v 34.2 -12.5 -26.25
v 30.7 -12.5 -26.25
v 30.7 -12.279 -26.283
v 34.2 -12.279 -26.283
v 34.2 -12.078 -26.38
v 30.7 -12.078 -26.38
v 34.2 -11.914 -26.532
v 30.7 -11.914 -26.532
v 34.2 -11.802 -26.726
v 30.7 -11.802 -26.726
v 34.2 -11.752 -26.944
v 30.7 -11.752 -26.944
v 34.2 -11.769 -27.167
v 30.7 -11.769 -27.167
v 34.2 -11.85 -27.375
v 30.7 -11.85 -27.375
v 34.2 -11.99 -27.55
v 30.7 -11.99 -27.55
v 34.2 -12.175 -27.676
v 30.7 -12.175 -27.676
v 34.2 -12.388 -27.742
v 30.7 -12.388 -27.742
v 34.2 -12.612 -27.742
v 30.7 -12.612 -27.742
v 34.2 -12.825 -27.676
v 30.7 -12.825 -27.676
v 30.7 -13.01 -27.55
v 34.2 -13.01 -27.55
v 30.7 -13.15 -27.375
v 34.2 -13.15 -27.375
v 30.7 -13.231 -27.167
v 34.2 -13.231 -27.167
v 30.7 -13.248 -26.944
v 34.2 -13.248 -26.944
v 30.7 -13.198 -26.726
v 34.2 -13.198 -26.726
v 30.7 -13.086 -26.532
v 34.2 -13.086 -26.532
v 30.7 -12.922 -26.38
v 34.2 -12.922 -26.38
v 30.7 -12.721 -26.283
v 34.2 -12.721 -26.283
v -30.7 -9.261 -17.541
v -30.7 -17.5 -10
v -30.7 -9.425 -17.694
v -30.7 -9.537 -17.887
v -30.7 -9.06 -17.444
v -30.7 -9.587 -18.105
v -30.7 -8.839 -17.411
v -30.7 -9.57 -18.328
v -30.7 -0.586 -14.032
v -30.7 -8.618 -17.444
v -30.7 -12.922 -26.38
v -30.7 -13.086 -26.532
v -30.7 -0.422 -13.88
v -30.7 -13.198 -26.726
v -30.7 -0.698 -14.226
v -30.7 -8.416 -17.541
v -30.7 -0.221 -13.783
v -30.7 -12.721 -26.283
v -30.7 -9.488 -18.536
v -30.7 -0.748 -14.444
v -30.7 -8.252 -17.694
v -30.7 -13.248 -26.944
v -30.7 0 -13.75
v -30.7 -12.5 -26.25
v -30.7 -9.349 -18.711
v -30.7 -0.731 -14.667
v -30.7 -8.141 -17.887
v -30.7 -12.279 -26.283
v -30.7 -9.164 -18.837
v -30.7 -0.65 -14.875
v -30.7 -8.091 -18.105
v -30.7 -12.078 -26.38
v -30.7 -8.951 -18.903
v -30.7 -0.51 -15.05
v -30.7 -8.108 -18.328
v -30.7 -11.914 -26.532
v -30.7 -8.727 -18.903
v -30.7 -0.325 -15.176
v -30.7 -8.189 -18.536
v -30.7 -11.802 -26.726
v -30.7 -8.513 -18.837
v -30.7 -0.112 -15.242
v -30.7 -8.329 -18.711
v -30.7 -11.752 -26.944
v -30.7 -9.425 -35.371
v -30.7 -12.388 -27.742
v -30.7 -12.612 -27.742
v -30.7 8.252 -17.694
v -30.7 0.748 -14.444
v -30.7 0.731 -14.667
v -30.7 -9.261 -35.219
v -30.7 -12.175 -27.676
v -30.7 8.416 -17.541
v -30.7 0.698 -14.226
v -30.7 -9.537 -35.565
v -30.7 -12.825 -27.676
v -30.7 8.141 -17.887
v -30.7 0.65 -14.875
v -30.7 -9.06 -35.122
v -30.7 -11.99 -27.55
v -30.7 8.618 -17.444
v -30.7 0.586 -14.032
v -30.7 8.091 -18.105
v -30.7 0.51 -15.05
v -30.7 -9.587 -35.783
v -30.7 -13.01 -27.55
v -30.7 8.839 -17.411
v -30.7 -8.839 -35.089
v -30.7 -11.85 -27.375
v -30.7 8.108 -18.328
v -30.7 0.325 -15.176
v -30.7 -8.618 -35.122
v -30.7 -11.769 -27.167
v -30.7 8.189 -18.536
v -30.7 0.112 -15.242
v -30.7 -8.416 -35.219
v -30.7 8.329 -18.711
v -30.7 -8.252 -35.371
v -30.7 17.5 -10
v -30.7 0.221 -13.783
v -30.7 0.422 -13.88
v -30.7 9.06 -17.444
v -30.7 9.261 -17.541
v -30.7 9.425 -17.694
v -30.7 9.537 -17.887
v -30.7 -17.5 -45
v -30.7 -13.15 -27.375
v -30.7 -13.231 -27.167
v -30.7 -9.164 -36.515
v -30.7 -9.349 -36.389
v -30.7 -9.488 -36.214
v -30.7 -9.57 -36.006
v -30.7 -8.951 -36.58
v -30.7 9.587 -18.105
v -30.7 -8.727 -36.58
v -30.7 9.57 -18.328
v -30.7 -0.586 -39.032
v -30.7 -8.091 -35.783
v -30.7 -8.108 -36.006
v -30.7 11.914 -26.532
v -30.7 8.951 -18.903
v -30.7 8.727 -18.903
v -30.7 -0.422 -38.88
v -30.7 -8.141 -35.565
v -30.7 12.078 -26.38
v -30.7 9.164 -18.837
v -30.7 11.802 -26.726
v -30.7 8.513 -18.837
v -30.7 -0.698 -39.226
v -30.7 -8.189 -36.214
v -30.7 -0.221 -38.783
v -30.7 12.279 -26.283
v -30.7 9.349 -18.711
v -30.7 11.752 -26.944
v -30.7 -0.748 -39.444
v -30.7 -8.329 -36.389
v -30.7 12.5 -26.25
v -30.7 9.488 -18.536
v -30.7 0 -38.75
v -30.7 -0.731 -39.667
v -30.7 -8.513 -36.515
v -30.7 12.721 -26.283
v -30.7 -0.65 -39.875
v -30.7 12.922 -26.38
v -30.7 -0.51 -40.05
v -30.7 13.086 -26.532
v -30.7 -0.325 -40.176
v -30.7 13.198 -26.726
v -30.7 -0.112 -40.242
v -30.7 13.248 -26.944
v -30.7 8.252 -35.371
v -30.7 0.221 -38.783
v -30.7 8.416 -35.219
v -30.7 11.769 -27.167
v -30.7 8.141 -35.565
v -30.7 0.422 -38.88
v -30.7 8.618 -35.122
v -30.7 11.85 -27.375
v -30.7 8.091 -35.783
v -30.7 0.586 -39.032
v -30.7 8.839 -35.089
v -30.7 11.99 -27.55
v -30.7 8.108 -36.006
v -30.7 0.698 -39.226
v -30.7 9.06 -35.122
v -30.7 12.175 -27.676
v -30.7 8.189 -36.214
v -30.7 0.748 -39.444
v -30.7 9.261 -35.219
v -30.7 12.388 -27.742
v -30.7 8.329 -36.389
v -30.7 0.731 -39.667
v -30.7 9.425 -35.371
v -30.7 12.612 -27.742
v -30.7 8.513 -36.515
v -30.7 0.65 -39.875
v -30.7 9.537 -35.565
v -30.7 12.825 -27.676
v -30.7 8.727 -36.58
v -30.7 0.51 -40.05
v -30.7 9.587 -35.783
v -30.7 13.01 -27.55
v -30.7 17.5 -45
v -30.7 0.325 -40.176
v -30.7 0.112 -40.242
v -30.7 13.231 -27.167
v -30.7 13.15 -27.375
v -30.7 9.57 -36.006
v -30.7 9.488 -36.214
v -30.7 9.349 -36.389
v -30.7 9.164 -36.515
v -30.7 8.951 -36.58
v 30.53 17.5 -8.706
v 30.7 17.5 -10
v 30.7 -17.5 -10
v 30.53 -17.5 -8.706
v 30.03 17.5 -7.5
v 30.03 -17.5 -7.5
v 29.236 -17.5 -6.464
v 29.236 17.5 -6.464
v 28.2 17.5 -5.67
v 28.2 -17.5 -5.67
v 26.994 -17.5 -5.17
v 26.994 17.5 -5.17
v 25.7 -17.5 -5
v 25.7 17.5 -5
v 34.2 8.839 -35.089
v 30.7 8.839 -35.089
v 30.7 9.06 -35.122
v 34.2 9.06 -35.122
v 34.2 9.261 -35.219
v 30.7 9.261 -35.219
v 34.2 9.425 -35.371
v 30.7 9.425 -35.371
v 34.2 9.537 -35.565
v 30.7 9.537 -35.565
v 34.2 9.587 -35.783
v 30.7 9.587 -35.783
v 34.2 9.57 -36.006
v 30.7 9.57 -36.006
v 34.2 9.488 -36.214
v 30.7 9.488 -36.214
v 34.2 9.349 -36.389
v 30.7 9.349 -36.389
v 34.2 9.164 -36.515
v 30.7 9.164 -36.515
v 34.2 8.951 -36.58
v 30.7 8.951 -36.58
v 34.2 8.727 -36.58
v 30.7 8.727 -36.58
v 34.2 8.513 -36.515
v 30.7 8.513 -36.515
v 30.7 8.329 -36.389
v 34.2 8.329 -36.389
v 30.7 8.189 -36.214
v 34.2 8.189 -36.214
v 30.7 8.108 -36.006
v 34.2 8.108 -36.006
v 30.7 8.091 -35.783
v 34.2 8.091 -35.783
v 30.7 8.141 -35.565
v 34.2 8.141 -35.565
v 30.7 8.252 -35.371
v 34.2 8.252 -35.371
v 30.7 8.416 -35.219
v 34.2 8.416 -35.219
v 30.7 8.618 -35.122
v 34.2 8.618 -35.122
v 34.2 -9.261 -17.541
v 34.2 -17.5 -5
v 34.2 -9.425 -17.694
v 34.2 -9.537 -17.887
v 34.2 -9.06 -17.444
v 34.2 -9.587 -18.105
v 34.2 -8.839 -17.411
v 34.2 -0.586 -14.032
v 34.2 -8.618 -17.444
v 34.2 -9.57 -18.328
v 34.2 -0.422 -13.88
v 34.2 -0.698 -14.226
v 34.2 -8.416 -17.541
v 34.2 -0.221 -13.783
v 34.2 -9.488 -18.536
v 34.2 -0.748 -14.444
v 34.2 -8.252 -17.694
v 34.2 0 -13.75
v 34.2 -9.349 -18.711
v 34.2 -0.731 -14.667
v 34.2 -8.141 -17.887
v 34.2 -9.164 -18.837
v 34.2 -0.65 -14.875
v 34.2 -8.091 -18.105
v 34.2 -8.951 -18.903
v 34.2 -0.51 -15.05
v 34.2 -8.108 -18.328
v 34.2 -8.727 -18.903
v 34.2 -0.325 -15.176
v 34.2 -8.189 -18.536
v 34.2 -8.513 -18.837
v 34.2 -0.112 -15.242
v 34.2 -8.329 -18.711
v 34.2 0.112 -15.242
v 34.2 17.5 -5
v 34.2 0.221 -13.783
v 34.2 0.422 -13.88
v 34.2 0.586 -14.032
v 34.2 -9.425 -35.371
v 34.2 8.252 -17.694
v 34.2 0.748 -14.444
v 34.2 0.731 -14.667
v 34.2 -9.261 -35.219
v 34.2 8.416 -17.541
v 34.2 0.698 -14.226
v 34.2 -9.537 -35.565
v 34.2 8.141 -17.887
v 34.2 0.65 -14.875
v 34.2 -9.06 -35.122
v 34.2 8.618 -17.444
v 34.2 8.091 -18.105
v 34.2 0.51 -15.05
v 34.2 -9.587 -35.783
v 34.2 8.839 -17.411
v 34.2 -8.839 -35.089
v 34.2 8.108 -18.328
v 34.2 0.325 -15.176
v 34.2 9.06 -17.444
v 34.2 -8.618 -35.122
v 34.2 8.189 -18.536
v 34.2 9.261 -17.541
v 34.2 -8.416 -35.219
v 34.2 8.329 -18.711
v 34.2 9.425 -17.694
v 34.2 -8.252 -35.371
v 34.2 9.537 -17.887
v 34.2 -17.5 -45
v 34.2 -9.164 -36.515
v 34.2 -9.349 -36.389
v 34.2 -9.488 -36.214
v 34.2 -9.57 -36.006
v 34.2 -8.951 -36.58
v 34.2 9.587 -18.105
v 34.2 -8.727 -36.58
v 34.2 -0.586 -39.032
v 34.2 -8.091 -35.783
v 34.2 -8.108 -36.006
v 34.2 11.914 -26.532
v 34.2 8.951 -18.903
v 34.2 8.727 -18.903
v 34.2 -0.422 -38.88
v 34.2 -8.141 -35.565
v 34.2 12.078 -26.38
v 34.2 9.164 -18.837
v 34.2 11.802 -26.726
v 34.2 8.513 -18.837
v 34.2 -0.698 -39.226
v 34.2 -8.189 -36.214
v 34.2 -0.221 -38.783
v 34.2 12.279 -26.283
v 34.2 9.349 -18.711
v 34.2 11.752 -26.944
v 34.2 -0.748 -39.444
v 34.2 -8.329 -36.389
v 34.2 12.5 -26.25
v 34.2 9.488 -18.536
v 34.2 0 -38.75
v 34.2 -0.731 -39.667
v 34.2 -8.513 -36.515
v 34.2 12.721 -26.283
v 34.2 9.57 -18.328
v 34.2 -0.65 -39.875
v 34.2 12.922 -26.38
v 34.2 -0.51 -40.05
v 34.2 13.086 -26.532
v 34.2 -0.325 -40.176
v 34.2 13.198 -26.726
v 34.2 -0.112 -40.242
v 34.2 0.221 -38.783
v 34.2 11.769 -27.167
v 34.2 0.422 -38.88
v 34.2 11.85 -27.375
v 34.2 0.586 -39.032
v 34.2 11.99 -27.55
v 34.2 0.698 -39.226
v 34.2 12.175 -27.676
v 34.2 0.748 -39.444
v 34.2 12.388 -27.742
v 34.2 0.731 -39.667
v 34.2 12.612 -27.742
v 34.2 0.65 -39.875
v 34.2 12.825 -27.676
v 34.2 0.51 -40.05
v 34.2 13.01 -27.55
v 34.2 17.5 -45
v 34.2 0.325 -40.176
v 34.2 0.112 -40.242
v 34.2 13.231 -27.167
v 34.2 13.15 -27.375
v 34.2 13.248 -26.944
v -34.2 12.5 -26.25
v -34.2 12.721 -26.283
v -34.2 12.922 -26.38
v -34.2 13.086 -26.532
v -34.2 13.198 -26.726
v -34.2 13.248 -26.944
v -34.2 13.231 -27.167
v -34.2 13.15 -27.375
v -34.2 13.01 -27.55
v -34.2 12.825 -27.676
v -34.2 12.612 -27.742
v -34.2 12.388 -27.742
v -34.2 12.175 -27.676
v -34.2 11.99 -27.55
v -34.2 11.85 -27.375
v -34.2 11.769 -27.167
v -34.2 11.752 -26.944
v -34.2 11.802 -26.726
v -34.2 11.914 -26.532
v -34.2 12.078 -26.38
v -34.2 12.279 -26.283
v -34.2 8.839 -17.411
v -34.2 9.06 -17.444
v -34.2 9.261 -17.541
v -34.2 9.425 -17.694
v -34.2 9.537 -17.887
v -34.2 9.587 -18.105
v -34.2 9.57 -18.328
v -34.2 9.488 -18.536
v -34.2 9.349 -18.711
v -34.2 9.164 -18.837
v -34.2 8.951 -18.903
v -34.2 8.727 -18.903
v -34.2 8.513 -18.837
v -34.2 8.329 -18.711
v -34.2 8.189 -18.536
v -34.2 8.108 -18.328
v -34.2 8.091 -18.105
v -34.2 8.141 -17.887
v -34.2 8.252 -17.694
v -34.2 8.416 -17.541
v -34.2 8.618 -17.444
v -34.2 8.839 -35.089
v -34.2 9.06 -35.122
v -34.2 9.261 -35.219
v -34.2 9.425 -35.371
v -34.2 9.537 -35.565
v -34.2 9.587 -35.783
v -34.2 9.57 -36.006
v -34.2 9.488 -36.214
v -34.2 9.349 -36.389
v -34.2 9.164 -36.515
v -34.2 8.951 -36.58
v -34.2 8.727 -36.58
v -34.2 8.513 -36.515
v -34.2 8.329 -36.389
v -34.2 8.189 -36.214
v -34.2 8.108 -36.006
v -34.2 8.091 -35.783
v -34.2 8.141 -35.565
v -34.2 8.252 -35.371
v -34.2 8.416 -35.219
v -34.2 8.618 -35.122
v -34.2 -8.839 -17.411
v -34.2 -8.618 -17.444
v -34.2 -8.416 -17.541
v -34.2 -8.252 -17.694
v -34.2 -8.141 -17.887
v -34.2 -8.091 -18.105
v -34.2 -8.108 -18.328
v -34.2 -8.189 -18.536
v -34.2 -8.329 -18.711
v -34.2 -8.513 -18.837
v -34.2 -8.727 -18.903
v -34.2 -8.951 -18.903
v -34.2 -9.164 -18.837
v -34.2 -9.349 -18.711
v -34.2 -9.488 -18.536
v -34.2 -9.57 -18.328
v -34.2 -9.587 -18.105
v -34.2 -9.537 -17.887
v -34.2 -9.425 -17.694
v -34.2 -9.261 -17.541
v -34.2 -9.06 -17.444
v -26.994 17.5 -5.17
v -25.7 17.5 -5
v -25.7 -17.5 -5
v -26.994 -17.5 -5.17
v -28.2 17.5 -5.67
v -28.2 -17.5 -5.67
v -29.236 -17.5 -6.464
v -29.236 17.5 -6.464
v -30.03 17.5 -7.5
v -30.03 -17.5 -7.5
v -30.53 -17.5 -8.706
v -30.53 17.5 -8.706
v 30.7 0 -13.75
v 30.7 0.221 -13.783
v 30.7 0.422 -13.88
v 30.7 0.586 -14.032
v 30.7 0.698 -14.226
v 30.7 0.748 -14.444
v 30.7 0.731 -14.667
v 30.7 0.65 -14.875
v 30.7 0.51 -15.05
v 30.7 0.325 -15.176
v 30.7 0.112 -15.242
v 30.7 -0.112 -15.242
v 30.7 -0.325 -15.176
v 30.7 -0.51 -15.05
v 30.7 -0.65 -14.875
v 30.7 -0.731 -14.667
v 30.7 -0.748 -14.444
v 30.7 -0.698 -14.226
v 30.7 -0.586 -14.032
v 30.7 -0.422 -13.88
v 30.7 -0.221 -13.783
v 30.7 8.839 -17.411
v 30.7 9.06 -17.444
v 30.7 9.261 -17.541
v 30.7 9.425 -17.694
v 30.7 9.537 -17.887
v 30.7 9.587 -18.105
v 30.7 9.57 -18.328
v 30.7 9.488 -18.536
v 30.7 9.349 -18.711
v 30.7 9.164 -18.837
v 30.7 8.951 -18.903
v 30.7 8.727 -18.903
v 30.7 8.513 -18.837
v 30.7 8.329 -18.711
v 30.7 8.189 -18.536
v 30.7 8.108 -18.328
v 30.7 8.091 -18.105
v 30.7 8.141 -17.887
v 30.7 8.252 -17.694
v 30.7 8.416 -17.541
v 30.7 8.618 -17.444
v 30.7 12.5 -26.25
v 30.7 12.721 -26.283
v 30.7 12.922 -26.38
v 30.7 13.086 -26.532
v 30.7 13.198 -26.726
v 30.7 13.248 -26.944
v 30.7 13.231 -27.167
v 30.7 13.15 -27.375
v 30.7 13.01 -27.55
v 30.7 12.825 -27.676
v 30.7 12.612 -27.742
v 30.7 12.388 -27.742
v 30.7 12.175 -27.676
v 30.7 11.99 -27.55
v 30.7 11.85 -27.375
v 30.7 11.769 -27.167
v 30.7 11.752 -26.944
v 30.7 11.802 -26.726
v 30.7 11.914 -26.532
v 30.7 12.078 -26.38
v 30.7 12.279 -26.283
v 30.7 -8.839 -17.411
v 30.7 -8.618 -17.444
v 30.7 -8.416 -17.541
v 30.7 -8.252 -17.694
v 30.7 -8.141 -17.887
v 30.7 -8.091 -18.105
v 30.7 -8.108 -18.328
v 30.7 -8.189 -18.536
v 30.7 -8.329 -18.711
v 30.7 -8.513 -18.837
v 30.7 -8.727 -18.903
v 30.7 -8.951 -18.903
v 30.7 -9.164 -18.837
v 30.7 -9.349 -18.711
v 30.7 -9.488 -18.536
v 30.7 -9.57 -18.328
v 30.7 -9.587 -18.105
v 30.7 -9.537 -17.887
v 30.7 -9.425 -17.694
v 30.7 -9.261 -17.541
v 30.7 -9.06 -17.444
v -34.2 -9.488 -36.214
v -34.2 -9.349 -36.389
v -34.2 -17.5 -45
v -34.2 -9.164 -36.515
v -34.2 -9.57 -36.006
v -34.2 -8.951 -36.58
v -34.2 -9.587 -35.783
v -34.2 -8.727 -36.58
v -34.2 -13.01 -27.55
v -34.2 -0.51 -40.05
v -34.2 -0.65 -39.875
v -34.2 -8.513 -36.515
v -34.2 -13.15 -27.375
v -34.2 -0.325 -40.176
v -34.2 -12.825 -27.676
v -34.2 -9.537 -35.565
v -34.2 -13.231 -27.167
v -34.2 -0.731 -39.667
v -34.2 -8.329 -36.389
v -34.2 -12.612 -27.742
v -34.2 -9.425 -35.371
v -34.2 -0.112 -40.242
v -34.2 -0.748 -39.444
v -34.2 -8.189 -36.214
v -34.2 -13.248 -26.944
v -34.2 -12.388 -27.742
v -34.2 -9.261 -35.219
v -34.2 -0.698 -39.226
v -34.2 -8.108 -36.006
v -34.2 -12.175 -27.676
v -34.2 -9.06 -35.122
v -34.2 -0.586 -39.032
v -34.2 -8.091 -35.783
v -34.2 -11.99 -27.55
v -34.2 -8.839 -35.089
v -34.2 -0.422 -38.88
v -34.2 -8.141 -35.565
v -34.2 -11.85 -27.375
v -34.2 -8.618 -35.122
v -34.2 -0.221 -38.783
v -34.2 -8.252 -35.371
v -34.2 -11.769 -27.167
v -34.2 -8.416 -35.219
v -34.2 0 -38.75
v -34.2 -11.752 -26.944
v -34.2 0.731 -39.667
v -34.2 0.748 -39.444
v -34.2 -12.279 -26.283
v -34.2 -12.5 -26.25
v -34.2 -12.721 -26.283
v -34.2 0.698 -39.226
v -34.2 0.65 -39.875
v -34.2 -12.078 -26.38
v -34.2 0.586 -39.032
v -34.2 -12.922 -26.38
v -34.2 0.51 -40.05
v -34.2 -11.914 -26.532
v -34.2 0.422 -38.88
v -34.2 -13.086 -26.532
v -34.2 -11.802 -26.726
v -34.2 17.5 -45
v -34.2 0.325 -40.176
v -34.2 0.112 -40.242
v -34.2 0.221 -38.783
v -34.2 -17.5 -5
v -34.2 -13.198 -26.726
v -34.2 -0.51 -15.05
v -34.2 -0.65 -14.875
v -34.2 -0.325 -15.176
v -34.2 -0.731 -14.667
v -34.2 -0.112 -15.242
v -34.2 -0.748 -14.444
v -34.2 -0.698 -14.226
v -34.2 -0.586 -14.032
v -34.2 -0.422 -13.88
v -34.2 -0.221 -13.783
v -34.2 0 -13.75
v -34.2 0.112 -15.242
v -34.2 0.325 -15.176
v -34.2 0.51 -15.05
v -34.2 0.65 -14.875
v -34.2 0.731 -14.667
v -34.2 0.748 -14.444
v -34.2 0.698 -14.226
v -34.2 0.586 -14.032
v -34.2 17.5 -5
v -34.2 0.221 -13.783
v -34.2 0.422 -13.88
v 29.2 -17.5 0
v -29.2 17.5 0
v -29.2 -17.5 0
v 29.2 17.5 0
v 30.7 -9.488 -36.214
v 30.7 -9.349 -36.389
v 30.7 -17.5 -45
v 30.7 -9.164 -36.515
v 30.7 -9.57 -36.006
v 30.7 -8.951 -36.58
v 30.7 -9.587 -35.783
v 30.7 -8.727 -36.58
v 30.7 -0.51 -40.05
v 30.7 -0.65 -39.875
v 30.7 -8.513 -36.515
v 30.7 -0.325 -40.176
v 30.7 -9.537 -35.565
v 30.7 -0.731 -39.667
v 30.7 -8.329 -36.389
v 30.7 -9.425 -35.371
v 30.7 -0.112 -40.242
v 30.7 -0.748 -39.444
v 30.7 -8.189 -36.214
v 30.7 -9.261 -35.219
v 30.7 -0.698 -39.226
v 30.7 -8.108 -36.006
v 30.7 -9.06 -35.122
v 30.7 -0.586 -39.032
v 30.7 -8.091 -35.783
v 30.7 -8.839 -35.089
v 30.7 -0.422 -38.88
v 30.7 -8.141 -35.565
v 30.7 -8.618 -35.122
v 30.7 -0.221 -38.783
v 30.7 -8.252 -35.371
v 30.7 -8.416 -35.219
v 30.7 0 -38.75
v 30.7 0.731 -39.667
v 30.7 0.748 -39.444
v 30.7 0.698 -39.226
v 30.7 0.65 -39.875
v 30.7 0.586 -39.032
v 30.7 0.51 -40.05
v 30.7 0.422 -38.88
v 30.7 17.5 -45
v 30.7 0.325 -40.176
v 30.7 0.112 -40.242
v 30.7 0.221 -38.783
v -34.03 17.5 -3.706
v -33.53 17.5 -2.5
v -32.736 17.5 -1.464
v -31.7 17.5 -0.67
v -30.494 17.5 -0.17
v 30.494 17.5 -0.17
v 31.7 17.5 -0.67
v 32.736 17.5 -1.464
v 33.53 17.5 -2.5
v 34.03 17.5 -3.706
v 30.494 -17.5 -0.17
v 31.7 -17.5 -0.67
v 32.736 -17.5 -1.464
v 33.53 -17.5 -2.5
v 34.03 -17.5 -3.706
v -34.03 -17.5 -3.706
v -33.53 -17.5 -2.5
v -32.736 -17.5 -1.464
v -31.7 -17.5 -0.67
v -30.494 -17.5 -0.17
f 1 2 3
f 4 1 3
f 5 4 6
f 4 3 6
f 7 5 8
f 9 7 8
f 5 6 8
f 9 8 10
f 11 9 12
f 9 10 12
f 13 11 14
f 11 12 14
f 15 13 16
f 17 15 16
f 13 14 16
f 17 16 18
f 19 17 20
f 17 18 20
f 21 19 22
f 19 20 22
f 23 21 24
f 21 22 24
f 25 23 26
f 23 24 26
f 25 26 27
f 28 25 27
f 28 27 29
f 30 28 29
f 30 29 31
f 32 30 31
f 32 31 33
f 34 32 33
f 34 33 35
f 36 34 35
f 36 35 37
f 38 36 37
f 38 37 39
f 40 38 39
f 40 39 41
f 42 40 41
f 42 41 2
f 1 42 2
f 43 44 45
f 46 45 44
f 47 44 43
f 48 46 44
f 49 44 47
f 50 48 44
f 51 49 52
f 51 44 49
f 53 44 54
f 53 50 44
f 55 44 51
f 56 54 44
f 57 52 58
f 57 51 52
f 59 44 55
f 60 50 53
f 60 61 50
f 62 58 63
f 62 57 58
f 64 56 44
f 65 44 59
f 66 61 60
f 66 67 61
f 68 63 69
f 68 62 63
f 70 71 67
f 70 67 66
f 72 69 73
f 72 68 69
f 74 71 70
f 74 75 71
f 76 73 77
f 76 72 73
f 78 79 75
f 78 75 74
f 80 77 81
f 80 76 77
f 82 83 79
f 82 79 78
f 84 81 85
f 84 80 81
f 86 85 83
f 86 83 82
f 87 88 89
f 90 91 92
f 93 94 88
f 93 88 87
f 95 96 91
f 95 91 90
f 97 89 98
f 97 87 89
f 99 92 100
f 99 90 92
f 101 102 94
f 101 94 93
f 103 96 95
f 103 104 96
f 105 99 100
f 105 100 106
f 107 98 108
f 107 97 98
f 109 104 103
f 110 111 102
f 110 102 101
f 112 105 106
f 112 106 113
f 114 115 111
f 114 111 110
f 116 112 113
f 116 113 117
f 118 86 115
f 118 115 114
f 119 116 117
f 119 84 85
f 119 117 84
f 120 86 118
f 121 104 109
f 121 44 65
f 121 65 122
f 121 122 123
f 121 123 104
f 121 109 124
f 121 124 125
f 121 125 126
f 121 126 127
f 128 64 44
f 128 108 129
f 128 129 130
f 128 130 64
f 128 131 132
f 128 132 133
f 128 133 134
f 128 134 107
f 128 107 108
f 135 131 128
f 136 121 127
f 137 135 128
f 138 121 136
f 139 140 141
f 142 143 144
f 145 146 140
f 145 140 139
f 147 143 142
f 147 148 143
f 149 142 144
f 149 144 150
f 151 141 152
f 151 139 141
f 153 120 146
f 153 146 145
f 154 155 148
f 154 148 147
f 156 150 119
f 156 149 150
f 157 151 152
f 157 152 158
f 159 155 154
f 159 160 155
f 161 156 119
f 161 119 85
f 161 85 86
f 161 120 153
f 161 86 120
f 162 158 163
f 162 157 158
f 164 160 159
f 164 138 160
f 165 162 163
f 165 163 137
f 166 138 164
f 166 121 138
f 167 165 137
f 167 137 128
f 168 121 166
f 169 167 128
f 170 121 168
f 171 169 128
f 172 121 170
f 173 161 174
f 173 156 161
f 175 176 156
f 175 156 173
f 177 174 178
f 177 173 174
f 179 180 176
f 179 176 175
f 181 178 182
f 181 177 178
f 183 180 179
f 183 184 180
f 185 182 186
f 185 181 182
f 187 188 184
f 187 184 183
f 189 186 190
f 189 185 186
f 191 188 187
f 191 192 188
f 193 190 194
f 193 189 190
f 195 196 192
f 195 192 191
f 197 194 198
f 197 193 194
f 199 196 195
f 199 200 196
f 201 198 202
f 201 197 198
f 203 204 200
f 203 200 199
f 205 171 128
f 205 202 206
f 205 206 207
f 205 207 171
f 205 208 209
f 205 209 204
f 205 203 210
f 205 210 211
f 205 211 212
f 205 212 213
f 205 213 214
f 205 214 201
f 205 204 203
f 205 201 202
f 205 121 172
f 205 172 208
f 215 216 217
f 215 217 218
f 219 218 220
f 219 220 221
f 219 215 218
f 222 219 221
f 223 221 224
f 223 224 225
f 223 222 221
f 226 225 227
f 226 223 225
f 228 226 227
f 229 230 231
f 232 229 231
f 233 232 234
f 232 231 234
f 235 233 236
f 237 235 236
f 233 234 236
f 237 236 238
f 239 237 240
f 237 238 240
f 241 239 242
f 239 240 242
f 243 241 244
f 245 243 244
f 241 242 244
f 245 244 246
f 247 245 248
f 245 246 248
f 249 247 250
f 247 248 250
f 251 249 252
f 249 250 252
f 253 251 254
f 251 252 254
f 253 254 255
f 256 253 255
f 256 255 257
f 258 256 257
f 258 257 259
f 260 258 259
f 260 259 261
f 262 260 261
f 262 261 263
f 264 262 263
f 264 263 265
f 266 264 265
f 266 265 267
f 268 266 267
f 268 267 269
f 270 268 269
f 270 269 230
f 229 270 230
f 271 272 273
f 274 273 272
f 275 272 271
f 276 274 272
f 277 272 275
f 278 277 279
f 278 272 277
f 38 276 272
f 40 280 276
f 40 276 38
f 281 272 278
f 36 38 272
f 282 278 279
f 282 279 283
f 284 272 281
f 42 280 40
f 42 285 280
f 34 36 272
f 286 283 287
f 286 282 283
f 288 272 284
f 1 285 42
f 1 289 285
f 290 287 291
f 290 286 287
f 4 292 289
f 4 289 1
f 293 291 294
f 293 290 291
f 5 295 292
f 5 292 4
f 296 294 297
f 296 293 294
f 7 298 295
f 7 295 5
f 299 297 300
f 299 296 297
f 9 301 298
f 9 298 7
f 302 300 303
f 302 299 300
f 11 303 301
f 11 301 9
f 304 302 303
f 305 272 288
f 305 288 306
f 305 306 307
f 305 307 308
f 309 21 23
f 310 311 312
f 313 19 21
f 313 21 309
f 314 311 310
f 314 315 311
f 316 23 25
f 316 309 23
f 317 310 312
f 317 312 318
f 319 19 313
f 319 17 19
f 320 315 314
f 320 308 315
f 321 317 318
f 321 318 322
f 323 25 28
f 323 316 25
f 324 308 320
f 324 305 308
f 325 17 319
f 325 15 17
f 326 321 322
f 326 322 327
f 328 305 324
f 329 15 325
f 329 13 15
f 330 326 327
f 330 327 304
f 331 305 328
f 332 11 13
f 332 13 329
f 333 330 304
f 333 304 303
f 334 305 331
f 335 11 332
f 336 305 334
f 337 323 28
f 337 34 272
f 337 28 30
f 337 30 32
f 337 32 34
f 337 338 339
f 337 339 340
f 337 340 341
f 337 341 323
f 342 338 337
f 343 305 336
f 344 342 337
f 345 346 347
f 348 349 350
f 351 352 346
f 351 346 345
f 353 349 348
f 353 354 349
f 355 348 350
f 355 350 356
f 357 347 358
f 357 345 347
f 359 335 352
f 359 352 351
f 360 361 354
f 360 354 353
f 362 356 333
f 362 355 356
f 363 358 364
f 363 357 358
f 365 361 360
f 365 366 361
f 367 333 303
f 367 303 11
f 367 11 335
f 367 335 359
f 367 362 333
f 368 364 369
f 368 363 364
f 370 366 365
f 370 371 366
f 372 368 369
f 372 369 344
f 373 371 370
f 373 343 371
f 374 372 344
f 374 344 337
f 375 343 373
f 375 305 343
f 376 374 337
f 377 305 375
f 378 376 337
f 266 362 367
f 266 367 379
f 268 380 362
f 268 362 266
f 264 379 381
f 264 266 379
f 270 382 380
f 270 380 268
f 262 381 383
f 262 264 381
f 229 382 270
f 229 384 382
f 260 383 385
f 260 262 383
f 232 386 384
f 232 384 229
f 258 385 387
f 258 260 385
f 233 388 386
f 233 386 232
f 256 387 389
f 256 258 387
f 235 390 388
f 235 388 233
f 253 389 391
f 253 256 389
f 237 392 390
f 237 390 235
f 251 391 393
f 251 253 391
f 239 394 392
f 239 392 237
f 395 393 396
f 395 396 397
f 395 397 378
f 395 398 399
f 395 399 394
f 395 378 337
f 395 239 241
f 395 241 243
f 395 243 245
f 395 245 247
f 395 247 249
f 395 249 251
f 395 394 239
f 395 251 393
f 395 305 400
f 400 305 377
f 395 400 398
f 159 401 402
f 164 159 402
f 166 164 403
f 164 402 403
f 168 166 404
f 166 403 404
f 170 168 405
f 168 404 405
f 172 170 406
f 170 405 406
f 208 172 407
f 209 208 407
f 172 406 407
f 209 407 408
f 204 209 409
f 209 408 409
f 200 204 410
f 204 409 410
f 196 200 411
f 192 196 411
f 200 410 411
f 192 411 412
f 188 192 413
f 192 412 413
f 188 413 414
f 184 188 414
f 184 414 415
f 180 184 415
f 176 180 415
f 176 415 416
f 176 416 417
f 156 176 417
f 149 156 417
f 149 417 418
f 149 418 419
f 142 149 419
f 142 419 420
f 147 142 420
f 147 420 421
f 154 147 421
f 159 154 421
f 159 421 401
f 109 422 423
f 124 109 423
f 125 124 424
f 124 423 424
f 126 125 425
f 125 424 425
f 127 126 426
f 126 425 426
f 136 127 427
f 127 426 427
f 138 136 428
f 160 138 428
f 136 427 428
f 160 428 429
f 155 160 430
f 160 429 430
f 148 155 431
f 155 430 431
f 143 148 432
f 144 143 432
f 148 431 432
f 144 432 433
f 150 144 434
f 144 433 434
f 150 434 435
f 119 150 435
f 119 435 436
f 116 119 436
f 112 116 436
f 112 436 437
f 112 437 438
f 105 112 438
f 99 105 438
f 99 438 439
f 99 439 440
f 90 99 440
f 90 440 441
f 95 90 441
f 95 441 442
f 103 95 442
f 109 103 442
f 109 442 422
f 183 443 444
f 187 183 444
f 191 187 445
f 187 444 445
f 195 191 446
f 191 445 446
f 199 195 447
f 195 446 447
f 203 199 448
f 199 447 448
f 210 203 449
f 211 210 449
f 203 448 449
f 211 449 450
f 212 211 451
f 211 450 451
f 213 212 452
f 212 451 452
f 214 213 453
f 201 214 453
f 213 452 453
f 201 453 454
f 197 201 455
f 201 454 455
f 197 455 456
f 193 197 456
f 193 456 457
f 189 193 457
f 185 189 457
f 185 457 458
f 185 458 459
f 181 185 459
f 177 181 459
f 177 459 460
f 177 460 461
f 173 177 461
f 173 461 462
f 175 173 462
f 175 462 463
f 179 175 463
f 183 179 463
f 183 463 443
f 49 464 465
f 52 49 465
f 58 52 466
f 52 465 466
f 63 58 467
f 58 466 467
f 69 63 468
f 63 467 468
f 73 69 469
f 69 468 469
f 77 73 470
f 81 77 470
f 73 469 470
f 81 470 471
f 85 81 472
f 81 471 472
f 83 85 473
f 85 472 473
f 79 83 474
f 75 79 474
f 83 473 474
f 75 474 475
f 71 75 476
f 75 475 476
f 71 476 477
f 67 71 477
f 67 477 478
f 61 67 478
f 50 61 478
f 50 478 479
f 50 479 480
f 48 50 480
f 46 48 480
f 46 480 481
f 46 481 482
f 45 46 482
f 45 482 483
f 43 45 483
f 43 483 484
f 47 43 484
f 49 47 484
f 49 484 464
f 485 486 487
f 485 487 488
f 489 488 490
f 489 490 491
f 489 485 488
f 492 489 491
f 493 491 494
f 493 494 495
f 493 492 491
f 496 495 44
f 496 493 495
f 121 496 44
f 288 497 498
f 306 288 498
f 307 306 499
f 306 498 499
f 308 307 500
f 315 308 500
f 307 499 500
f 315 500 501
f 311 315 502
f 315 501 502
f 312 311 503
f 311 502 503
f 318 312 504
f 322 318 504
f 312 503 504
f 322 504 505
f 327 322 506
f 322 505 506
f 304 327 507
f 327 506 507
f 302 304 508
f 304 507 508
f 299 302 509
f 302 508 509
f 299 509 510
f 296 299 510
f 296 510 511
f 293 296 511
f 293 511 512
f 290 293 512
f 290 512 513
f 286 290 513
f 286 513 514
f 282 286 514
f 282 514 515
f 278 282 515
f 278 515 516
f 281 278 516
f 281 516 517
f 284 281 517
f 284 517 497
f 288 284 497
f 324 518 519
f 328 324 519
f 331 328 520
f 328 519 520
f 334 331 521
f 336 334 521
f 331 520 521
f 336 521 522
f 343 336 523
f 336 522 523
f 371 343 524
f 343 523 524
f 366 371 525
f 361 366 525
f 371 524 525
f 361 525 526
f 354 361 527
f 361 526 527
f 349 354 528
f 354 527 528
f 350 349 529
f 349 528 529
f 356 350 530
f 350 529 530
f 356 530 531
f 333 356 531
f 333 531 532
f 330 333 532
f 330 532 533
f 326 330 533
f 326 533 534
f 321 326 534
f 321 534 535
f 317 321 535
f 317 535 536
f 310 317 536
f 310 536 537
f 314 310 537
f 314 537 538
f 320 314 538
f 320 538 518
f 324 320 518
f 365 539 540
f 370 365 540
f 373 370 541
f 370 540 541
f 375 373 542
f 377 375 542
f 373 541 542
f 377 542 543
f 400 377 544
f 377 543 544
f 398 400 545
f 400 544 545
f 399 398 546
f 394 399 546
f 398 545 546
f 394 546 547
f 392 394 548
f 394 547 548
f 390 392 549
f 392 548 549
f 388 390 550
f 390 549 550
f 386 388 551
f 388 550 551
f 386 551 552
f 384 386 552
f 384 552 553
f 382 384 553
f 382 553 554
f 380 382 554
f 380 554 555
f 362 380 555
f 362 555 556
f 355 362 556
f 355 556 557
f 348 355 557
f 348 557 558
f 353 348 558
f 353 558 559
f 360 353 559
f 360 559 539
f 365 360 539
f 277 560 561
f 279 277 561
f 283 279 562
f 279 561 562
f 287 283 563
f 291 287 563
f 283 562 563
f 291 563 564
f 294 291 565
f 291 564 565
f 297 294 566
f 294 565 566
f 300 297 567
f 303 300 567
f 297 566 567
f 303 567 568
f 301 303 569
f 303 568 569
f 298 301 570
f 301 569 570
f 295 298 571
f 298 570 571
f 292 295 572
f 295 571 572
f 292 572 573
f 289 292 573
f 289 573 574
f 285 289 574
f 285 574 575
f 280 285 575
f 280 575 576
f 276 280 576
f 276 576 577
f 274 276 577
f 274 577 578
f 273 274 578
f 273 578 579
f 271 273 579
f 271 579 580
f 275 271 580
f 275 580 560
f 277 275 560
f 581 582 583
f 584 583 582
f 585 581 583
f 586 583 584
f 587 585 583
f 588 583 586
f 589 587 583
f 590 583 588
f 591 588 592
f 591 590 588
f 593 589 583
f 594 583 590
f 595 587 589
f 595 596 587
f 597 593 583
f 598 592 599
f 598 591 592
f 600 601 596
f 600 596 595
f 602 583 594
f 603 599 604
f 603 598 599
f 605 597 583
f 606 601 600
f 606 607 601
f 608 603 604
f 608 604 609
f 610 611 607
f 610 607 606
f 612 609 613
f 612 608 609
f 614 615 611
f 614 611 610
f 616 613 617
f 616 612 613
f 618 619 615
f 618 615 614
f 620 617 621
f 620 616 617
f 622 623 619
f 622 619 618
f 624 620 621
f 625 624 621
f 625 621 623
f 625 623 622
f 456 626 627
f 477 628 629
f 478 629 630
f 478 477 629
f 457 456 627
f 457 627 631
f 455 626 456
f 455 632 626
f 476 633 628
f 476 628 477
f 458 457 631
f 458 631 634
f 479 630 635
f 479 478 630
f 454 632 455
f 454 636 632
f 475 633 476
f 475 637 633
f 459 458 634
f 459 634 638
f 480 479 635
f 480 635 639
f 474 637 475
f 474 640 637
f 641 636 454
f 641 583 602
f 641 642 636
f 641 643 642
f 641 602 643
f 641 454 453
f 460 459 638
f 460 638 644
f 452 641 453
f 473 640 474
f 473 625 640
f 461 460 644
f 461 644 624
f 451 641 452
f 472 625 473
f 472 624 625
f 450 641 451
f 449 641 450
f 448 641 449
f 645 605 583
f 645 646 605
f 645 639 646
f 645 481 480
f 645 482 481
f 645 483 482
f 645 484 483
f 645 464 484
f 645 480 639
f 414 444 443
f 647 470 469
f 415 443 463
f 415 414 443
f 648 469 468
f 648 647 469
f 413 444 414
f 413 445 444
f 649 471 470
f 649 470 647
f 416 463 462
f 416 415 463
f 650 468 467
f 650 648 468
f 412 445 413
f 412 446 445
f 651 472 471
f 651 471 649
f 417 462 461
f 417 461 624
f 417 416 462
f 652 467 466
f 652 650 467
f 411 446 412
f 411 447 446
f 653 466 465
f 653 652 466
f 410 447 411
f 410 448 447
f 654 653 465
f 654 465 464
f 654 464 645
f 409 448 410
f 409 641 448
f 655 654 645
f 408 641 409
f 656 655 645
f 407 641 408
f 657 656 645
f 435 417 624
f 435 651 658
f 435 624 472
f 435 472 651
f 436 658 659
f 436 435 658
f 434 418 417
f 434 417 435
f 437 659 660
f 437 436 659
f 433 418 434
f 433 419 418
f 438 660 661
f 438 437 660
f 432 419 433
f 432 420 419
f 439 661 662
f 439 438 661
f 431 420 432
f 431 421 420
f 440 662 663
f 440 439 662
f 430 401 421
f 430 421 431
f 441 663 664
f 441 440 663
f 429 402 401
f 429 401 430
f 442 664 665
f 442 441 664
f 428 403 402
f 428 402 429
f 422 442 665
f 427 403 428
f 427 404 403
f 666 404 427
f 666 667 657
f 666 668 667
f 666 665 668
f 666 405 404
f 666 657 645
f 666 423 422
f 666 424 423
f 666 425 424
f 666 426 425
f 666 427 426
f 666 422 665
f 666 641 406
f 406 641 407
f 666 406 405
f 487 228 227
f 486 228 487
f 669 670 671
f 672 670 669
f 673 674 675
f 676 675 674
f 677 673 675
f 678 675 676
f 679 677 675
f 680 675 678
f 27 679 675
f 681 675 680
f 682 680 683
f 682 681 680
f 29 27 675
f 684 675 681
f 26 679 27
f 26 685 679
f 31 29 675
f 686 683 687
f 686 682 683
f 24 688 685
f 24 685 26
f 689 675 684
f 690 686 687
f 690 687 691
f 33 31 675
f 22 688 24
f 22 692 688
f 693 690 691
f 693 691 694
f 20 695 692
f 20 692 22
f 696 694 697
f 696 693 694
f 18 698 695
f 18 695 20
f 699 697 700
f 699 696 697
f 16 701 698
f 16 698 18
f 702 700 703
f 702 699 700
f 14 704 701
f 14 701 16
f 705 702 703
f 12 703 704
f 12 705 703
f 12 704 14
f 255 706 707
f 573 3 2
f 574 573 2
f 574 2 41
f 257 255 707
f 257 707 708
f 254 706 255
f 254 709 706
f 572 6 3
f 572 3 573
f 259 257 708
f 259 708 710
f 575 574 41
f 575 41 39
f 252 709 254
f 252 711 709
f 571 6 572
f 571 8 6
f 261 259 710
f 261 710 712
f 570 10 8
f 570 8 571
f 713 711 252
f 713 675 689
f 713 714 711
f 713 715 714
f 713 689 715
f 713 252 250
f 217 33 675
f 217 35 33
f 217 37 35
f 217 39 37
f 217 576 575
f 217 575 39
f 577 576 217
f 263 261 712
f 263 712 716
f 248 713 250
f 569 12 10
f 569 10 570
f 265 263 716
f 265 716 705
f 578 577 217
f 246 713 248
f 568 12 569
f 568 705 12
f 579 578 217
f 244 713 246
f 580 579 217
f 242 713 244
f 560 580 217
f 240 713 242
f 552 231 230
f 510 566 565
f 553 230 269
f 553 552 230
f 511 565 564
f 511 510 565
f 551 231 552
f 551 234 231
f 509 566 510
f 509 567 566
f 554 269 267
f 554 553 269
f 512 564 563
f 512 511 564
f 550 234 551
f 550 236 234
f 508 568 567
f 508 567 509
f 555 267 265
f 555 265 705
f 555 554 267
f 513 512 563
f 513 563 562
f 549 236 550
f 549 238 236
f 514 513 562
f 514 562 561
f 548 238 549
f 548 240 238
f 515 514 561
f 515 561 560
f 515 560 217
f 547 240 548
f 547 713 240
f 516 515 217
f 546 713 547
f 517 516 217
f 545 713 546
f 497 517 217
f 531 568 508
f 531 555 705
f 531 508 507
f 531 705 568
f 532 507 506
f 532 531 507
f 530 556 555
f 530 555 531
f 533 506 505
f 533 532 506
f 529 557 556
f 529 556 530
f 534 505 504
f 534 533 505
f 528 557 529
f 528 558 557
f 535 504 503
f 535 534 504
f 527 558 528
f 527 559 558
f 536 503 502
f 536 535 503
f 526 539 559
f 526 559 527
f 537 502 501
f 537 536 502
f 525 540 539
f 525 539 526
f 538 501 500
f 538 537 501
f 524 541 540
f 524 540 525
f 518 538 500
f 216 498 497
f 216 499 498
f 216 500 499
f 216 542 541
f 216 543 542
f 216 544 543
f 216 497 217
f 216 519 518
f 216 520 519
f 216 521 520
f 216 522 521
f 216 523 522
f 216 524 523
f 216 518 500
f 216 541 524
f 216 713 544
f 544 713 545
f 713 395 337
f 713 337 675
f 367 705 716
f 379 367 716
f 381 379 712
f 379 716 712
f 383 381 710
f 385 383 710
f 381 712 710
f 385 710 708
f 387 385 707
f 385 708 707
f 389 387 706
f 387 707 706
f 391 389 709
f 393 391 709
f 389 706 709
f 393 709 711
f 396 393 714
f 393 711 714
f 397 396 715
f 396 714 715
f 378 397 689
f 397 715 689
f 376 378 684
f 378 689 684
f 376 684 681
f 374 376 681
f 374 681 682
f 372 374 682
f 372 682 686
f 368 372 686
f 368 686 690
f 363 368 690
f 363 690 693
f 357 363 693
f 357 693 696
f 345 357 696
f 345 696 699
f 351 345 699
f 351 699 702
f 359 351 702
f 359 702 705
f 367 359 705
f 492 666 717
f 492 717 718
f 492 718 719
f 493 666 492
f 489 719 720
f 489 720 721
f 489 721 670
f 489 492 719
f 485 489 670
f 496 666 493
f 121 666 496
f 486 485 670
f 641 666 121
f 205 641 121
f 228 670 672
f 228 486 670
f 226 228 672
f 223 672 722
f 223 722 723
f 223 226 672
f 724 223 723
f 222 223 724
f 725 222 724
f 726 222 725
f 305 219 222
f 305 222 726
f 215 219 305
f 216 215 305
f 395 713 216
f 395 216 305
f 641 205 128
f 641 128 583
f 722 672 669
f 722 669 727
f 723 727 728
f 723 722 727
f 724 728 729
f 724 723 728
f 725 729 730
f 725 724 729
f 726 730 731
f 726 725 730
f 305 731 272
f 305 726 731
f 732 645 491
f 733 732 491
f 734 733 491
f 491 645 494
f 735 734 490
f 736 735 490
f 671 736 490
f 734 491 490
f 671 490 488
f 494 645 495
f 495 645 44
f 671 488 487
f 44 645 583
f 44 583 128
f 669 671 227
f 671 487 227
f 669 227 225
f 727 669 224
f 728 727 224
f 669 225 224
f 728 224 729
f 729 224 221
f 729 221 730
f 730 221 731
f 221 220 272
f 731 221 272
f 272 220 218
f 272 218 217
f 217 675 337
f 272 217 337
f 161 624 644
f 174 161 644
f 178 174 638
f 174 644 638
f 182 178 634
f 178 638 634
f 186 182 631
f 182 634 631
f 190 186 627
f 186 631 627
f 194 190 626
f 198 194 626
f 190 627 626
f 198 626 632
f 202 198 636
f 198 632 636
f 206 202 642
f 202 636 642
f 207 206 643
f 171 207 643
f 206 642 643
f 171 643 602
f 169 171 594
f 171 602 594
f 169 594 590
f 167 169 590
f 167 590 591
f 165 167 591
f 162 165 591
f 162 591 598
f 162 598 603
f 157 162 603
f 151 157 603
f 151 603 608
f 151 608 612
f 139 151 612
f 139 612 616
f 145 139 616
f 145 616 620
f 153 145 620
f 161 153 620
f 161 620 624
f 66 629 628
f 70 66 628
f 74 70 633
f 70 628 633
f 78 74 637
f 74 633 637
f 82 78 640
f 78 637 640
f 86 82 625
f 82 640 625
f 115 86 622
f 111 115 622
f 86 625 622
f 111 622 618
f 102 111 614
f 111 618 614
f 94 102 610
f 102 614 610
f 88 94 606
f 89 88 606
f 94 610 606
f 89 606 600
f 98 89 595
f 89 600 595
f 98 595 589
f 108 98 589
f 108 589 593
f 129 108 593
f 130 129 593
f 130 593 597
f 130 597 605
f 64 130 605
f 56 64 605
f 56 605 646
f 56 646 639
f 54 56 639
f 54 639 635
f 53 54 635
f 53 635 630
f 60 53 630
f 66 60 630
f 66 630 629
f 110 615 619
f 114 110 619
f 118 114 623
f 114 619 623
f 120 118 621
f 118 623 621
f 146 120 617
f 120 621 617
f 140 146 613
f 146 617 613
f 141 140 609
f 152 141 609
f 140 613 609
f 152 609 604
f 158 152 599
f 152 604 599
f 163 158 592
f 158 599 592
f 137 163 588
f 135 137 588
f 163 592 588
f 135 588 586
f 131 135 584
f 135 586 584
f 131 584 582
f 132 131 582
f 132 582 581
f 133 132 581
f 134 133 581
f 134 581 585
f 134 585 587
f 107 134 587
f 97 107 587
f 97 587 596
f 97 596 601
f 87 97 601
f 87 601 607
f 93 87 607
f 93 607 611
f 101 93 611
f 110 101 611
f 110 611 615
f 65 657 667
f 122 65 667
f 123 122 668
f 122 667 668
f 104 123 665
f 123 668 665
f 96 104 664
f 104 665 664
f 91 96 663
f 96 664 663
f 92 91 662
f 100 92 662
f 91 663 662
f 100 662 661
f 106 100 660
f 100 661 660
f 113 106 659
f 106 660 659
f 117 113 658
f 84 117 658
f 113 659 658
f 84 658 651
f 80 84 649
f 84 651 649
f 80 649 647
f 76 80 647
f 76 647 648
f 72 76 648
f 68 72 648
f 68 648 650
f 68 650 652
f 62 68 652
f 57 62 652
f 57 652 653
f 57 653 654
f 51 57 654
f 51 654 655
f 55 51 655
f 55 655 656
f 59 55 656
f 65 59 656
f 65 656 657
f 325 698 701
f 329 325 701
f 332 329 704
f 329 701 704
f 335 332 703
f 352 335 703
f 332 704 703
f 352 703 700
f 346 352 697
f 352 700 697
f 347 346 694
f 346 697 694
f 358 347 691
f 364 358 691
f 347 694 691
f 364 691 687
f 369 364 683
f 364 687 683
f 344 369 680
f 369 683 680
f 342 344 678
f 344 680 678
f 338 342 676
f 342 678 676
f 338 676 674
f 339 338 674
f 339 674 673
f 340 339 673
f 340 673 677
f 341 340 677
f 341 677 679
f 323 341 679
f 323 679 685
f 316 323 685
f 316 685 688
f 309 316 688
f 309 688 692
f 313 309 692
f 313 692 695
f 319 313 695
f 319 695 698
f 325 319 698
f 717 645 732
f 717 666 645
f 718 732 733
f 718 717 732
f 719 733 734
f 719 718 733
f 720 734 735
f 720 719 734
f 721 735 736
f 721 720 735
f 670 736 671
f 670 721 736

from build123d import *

# Parameters (mm, degrees)
BOSS_EXTRUDE1_DEPTH = 17.5
CUT_EXTRUDE1_REACH  = 85.725
SKETCH2_R           = 0.75
SKETCH2_3_R         = 0.75
CUT_EXTRUDE2_DEPTH  = 84.724608091


with BuildPart() as part:
    # Sketch1 → Boss-Extrude1 (new, symmetric)
    with BuildSketch(Plane(origin=(0, 0, 0), x_dir=(1, 0, 0), z_dir=(0, 1, 0))):
        with BuildLine():
            Line((-29.2, 0), (29.2, 0))
            ThreePointArc((29.2, 0), (32.735533906, 1.464466094), (34.2, 5))
            Line((34.2, 5), (34.2, 45))
            Line((34.2, 45), (30.7, 45))
            Line((30.7, 45), (30.7, 10))
            ThreePointArc((30.7, 10), (29.235533906, 6.464466094), (25.7, 5))
            Line((25.7, 5), (-25.7, 5))
            ThreePointArc((-25.7, 5), (-29.235533906, 6.464466094), (-30.7, 10))
            Line((-30.7, 10), (-30.7, 45))
            Line((-30.7, 45), (-34.2, 45))
            Line((-34.2, 45), (-34.2, 5))
            ThreePointArc((-34.2, 5), (-32.735533906, 1.464466094), (-29.2, 0))
        make_face()
    extrude(amount=BOSS_EXTRUDE1_DEPTH, both=True)

    # Cut-Extrude1: up to this face of the body (flat: up to its plane)
    cut_extrude1_end = Plane(part.part.faces().sort_by_distance((34.2, 0, -25))[0])
    # Sketch2 → Cut-Extrude1 (cut, up to the picked face)
    with BuildSketch(Plane.ZY.offset(34.2), mode=Mode.PRIVATE) as cut_extrude1_sk1:
        with Locations((-27, 12.5)):
            Circle(SKETCH2_R)
    cut_extrude1_tool1 = split(extrude(cut_extrude1_sk1.sketch, amount=-CUT_EXTRUDE1_REACH, mode=Mode.PRIVATE), bisect_by=cut_extrude1_end, keep=Keep.BOTH, mode=Mode.PRIVATE)
    # Sketch2 → Cut-Extrude1 (cut, up to the picked face)
    with BuildSketch(Plane.ZY.offset(34.2), mode=Mode.PRIVATE) as cut_extrude1_sk2:
        with Locations((-18.161165235, 8.838834765)):
            Circle(SKETCH2_R)
    cut_extrude1_tool2 = split(extrude(cut_extrude1_sk2.sketch, amount=-CUT_EXTRUDE1_REACH, mode=Mode.PRIVATE), bisect_by=cut_extrude1_end, keep=Keep.BOTH, mode=Mode.PRIVATE)
    # Sketch2 → Cut-Extrude1 (cut, up to the picked face)
    with BuildSketch(Plane.ZY.offset(34.2), mode=Mode.PRIVATE) as cut_extrude1_sk3:
        with Locations((-14.5, 0)):
            Circle(SKETCH2_R)
    cut_extrude1_tool3 = split(extrude(cut_extrude1_sk3.sketch, amount=-CUT_EXTRUDE1_REACH, mode=Mode.PRIVATE), bisect_by=cut_extrude1_end, keep=Keep.BOTH, mode=Mode.PRIVATE)
    # Sketch2 → Cut-Extrude1 (cut, up to the picked face)
    with BuildSketch(Plane.ZY.offset(34.2), mode=Mode.PRIVATE) as cut_extrude1_sk4:
        with Locations((-18.161165235, -8.838834765)):
            Circle(SKETCH2_R)
    cut_extrude1_tool4 = split(extrude(cut_extrude1_sk4.sketch, amount=-CUT_EXTRUDE1_REACH, mode=Mode.PRIVATE), bisect_by=cut_extrude1_end, keep=Keep.BOTH, mode=Mode.PRIVATE)
    # Sketch2 → Cut-Extrude1 (cut, up to the picked face)
    with BuildSketch(Plane.ZY.offset(34.2), mode=Mode.PRIVATE) as cut_extrude1_sk5:
        with Locations((-35.838834765, -8.838834765)):
            Circle(SKETCH2_R)
    cut_extrude1_tool5 = split(extrude(cut_extrude1_sk5.sketch, amount=-CUT_EXTRUDE1_REACH, mode=Mode.PRIVATE), bisect_by=cut_extrude1_end, keep=Keep.BOTH, mode=Mode.PRIVATE)
    # Sketch2 → Cut-Extrude1 (cut, up to the picked face)
    with BuildSketch(Plane.ZY.offset(34.2), mode=Mode.PRIVATE) as cut_extrude1_sk6:
        with Locations((-39.5, 0)):
            Circle(SKETCH2_R)
    cut_extrude1_tool6 = split(extrude(cut_extrude1_sk6.sketch, amount=-CUT_EXTRUDE1_REACH, mode=Mode.PRIVATE), bisect_by=cut_extrude1_end, keep=Keep.BOTH, mode=Mode.PRIVATE)
    # Sketch2 → Cut-Extrude1 (cut, up to the picked face)
    with BuildSketch(Plane.ZY.offset(34.2), mode=Mode.PRIVATE) as cut_extrude1_sk7:
        with Locations((-35.838834765, 8.838834765)):
            Circle(SKETCH2_R)
    cut_extrude1_tool7 = split(extrude(cut_extrude1_sk7.sketch, amount=-CUT_EXTRUDE1_REACH, mode=Mode.PRIVATE), bisect_by=cut_extrude1_end, keep=Keep.BOTH, mode=Mode.PRIVATE)
    add(cut_extrude1_tool1.solids().sort_by(Axis((-34.2, 12.5, -27), (1, 0, 0)))[0], mode=Mode.SUBTRACT)
    add(cut_extrude1_tool2.solids().sort_by(Axis((-34.2, 8.838835, -18.161165), (1, 0, 0)))[0], mode=Mode.SUBTRACT)
    add(cut_extrude1_tool3.solids().sort_by(Axis((-34.2, 0, -14.5), (1, 0, 0)))[0], mode=Mode.SUBTRACT)
    add(cut_extrude1_tool4.solids().sort_by(Axis((-34.2, -8.838835, -18.161165), (1, 0, 0)))[0], mode=Mode.SUBTRACT)
    add(cut_extrude1_tool5.solids().sort_by(Axis((-34.2, -8.838835, -35.838835), (1, 0, 0)))[0], mode=Mode.SUBTRACT)
    add(cut_extrude1_tool6.solids().sort_by(Axis((-34.2, 0, -39.5), (1, 0, 0)))[0], mode=Mode.SUBTRACT)
    add(cut_extrude1_tool7.solids().sort_by(Axis((-34.2, 8.838835, -35.838835), (1, 0, 0)))[0], mode=Mode.SUBTRACT)

    # Sketch2<3> → Cut-Extrude2 (cut, through all)
    with BuildSketch(Plane.ZY.offset(34.2)):
        with Locations((-27, -12.5)):
            Circle(SKETCH2_3_R)
    extrude(amount=-CUT_EXTRUDE2_DEPTH, mode=Mode.SUBTRACT)


solid = part.part
